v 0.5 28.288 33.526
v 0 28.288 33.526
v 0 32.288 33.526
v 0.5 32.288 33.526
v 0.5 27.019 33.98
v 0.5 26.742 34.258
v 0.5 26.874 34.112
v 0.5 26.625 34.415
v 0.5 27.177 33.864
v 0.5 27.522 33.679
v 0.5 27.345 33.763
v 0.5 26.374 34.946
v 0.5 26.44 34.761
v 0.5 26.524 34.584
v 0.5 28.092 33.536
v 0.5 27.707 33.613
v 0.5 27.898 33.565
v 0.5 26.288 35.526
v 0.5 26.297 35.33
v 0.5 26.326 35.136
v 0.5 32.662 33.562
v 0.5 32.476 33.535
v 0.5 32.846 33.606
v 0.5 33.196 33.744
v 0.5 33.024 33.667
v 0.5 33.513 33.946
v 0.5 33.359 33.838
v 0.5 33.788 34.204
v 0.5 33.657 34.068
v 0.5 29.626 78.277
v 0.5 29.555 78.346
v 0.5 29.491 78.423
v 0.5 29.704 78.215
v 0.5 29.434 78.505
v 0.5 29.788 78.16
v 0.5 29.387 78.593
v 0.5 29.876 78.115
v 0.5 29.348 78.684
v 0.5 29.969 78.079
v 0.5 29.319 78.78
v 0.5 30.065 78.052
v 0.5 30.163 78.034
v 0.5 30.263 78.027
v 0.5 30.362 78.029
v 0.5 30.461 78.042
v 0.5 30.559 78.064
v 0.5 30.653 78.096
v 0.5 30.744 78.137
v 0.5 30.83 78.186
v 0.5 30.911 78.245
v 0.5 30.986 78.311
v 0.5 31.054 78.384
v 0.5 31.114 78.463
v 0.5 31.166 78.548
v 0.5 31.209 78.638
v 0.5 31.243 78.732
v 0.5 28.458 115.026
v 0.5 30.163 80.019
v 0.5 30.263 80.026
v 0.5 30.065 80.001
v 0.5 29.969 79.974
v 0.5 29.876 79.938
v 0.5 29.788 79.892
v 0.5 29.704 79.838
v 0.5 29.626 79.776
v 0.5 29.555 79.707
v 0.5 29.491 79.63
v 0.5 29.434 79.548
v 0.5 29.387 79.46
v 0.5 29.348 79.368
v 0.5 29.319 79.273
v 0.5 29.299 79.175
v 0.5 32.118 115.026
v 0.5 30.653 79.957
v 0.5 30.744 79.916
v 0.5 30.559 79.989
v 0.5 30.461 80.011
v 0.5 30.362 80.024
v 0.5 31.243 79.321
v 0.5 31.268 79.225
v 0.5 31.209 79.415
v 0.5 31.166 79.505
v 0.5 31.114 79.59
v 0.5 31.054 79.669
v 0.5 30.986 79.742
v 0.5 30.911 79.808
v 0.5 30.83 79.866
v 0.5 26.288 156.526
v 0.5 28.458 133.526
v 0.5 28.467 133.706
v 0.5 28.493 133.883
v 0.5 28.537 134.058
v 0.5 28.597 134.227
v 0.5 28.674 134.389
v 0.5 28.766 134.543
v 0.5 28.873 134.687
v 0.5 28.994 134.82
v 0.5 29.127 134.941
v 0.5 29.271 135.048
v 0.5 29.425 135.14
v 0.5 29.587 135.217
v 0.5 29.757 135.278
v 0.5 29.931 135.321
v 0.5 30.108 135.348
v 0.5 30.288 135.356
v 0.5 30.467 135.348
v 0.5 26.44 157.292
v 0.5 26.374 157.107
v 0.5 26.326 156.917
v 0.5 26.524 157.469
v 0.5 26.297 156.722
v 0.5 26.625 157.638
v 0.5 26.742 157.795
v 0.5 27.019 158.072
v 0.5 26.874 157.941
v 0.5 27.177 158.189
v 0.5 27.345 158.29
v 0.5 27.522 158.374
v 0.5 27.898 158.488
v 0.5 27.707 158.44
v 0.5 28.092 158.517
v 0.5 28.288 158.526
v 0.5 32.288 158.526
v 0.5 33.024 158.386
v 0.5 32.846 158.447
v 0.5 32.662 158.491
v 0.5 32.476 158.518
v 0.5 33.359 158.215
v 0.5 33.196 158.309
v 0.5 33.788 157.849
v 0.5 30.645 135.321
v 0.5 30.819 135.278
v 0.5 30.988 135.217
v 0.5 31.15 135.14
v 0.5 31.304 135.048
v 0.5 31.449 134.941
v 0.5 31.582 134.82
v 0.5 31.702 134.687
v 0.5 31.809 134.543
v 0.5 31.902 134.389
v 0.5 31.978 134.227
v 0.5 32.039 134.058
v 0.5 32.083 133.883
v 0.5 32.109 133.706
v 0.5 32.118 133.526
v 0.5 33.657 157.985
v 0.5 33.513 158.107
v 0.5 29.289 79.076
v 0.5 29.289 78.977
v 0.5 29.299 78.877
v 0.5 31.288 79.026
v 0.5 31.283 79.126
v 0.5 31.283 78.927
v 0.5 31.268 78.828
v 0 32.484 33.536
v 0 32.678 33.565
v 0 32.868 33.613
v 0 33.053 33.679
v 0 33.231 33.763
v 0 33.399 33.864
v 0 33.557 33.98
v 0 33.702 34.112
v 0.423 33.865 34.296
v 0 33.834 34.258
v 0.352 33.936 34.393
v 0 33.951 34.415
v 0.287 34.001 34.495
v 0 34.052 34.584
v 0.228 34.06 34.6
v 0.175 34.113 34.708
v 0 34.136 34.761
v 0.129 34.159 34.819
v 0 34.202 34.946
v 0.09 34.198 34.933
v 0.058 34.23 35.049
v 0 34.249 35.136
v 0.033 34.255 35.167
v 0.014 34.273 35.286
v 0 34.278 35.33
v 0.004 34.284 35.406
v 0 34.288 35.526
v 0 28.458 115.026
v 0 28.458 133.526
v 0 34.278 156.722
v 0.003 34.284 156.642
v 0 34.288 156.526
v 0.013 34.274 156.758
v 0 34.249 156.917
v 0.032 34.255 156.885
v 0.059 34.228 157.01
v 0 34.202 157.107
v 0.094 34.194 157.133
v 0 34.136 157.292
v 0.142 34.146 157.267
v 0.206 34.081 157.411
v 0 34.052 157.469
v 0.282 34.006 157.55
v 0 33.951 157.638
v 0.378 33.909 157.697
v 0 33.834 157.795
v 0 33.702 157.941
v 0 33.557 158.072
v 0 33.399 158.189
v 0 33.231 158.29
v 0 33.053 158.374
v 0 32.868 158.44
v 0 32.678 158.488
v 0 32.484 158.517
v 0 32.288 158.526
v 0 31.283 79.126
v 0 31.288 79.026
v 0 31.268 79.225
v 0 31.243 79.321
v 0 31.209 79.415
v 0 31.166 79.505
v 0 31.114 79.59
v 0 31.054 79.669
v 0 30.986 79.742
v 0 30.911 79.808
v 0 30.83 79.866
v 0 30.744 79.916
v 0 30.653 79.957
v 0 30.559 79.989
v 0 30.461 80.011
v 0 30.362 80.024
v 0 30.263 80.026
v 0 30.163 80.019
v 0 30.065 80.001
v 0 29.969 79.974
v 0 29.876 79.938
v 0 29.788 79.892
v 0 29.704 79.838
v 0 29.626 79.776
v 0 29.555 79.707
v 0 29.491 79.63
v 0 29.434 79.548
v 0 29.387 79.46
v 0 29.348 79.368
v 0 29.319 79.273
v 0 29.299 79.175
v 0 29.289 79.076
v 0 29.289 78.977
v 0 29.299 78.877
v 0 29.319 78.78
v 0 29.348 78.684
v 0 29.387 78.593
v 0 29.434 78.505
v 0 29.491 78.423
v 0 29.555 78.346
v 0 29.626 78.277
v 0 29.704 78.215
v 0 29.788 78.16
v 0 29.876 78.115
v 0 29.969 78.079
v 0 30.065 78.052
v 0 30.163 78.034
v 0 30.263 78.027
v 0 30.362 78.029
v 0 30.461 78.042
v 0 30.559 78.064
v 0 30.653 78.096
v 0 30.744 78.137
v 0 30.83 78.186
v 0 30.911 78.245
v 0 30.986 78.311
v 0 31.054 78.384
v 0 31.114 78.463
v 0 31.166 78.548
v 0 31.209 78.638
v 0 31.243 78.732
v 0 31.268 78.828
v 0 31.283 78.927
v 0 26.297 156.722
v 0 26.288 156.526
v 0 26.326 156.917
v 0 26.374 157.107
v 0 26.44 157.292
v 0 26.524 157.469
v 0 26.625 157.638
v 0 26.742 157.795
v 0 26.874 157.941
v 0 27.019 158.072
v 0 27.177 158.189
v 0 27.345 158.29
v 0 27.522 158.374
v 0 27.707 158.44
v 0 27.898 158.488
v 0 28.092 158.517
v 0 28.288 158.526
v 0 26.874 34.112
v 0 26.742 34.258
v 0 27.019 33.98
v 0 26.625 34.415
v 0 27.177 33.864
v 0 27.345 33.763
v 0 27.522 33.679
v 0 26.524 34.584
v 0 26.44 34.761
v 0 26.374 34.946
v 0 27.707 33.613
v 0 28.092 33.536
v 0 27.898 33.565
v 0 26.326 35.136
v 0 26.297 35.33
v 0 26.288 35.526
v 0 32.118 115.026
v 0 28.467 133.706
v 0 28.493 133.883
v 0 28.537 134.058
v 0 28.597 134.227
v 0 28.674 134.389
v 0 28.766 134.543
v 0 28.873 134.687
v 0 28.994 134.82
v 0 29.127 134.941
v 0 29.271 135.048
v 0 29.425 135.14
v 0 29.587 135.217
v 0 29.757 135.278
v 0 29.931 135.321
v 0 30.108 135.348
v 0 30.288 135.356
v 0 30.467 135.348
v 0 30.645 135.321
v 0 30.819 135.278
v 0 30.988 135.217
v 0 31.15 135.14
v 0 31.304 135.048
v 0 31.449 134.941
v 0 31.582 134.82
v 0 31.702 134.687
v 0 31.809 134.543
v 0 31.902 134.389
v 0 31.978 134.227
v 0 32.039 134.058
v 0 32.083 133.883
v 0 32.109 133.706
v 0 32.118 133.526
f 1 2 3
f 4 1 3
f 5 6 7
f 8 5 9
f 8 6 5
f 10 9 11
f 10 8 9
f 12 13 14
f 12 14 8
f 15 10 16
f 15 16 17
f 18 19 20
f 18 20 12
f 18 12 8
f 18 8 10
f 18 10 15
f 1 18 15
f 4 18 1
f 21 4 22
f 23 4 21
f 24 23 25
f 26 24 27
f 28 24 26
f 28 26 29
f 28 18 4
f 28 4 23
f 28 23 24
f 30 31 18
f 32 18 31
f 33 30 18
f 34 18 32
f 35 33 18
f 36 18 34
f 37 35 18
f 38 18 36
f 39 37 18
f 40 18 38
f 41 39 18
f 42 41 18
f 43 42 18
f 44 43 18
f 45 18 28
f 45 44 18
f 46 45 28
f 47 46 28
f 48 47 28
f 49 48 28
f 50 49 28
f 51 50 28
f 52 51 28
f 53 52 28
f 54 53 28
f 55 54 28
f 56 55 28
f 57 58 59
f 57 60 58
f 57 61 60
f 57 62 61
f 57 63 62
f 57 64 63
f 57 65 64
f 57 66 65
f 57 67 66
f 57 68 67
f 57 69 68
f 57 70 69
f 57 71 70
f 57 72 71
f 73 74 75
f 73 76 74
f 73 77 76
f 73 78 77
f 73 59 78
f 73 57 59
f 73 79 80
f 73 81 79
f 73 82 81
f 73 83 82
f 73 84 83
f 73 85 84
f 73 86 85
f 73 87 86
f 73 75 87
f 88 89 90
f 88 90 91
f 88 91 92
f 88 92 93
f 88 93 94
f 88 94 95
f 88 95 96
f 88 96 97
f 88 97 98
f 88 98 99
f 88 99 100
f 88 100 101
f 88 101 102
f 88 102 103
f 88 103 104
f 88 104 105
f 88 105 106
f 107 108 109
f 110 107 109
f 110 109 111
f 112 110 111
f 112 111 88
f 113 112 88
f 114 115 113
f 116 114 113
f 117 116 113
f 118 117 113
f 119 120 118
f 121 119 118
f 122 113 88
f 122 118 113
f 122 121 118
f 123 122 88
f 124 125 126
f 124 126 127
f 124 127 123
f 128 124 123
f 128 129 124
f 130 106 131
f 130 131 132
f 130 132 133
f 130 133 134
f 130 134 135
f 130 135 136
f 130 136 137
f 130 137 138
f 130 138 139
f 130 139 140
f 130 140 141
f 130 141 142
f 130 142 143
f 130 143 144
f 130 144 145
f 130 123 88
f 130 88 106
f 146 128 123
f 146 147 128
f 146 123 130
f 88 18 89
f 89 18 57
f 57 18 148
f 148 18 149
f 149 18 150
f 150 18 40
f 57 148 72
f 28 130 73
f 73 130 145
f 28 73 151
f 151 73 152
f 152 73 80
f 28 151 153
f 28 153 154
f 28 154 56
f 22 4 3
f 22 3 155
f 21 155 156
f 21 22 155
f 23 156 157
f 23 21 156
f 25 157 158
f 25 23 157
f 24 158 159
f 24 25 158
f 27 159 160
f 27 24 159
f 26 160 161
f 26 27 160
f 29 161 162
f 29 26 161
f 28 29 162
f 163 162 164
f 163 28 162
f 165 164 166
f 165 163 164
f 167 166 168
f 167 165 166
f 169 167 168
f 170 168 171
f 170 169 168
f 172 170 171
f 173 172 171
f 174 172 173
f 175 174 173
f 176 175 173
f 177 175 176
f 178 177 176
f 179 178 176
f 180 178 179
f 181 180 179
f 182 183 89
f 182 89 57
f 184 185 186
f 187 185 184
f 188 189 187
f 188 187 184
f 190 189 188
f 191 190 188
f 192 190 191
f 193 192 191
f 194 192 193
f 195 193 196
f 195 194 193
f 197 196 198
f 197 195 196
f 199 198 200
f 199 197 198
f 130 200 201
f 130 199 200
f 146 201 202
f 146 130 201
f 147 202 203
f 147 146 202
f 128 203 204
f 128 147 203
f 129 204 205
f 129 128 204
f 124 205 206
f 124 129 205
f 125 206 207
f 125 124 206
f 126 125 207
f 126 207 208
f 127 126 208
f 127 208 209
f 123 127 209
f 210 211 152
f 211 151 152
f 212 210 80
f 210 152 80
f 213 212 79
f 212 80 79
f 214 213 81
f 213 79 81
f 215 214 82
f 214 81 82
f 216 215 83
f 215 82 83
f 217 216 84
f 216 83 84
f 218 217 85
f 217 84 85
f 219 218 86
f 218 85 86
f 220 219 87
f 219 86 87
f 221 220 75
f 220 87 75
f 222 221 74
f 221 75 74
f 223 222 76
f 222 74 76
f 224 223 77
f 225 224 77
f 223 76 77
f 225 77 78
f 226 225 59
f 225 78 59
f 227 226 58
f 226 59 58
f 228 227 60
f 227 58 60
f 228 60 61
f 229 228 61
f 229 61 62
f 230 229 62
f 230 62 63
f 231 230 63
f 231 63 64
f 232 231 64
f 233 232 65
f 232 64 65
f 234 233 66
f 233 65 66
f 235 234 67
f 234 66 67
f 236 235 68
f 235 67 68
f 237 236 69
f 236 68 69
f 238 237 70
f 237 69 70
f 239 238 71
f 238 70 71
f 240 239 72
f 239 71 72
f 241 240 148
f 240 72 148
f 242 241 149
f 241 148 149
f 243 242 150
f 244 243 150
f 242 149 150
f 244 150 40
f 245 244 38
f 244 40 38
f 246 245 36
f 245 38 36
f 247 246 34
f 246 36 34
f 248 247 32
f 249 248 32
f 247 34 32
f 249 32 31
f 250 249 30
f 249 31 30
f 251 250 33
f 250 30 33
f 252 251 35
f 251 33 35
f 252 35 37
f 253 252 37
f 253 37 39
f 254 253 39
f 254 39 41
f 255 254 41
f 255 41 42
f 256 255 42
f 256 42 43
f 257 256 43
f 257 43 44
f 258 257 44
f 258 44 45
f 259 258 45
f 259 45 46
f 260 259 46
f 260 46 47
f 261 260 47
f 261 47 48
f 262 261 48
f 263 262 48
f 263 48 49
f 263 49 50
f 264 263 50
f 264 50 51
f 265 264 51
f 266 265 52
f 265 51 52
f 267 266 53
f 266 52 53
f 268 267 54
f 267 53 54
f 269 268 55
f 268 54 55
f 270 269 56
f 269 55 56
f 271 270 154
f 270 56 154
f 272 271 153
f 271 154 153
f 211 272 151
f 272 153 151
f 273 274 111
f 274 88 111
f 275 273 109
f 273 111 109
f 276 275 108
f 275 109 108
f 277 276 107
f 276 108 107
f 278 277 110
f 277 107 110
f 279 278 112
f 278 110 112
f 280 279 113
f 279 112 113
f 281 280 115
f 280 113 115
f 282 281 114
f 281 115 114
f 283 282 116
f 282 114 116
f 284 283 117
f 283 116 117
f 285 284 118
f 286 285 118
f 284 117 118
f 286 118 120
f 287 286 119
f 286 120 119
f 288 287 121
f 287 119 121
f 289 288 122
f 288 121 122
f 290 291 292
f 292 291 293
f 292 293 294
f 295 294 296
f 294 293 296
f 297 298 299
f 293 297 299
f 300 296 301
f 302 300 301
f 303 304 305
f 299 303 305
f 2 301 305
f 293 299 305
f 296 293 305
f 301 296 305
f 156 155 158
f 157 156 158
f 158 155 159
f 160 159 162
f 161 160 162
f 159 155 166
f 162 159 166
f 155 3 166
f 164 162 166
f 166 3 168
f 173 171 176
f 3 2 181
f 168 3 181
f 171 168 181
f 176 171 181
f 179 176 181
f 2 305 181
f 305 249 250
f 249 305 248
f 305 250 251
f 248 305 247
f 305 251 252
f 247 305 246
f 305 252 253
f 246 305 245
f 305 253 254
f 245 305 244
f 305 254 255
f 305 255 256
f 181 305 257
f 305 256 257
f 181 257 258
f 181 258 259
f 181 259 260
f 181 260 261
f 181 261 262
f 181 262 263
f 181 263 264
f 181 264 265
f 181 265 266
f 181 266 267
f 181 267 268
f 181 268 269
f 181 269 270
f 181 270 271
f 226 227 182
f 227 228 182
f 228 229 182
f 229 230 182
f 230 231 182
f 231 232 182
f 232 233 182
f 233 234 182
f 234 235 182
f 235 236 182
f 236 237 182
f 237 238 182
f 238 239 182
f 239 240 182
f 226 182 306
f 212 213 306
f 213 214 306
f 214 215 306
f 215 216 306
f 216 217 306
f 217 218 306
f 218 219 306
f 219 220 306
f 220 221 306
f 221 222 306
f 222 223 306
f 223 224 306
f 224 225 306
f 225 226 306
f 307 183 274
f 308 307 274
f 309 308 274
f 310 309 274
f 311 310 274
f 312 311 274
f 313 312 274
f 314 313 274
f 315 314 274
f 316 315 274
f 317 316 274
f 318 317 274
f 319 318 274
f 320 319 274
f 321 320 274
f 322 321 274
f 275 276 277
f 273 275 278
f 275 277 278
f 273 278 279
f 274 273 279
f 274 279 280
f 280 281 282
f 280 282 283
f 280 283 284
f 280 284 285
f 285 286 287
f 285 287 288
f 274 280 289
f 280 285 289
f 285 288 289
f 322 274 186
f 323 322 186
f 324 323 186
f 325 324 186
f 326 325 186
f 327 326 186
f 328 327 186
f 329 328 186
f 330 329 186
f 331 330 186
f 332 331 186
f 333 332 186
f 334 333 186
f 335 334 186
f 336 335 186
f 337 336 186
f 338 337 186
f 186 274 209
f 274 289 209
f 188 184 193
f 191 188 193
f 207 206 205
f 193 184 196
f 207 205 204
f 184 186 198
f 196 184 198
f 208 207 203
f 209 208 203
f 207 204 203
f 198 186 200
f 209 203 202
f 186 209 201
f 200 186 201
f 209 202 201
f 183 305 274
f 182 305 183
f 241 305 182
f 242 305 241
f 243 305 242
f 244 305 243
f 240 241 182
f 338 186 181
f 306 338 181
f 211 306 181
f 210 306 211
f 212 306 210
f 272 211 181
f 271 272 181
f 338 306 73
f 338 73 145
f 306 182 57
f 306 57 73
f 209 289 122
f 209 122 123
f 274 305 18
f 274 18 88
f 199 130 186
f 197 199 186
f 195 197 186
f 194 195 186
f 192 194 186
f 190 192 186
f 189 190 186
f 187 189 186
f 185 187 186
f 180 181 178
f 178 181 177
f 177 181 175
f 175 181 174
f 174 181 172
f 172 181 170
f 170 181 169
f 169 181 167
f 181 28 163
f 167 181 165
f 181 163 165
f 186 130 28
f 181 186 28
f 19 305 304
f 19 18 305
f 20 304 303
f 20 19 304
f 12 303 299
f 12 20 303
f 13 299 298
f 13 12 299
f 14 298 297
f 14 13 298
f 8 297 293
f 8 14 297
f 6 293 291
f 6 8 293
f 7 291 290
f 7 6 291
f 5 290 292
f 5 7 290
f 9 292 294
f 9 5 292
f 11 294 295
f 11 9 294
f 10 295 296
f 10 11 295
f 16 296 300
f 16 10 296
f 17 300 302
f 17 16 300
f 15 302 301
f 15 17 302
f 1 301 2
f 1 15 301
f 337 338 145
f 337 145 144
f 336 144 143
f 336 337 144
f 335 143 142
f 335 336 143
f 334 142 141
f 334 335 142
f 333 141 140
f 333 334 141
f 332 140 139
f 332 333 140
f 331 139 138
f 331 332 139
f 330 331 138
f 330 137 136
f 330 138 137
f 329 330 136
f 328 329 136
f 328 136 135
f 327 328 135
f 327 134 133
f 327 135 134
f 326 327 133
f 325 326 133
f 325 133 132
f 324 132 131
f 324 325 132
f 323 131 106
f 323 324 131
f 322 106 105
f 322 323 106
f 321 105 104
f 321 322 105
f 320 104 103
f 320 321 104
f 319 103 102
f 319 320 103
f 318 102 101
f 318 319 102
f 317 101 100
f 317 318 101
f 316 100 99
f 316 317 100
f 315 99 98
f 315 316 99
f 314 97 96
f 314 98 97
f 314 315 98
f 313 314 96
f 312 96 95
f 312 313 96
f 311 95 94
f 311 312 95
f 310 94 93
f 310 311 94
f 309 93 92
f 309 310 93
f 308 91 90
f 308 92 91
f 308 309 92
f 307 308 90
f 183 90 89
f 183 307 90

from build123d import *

# Parameters (mm, degrees)
F0_W        = 8
F0_H        = 125
F1_DEPTH    = 0.5
F2_R        = 2
F3_R        = 1
F4_DEPTH    = 12.5
F5_T1_DEPTH = 125.3718610795


# Not quite as in the source:
# - a fillet or chamfer that OpenCascade refuses, or shapes differently, is made with other operations: its cross-section is extruded or revolved along the edge and cut away or added


with BuildPart() as f1:
    # F0 (on Right) → F1 (new body)
    with BuildSketch(Plane.YZ):
        with Locations((30.2877472714, 96.0264432559)):
            Rectangle(F0_W, F0_H)
    extrude(amount=F1_DEPTH)

    # F2
    f2_edges = [f1.edges().sort_by_distance(p)[0] for p in [
        (0.25, 26.287747, 158.526443),
        (0.25, 34.287747, 158.526443),
        (0.25, 34.287747, 33.526443),
        (0.25, 26.287747, 33.526443),
    ]]
    fillet(f2_edges, radius=F2_R)

    # F3 (on face) → F4 (cut, symmetric)
    with BuildSketch(Plane.YZ.offset(0.5)):
        with BuildLine():
            Line((28.4577472714, 133.5264432559), (28.4577472714, 115.0264432559))
            Line((28.4577472714, 115.0264432559), (32.1177472714, 115.0264432559))
            Line((32.1177472714, 115.0264432559), (32.1177472714, 133.5264432559))
            ThreePointArc((32.1177472714, 133.5264432559), (30.2877472714, 135.3564432559), (28.4577472714, 133.5264432559))
        make_face()
        with Locations((30.2877472714, 79.0264432559)):
            Circle(F3_R)
    extrude(amount=F4_DEPTH, both=True, mode=Mode.SUBTRACT)

    # F5: chamfer of 0.5 on 1 edges, made by hand

    # F5_s2 → F5_t1 (cut)
    with BuildSketch(Plane.XY.offset(33.3405127162)):
        Polygon((0.5, 33.7877472714), (0, 34.2877472714), (0.5, 34.2877472714), align=None)
    extrude(amount=F5_T1_DEPTH, mode=Mode.SUBTRACT)


solid = f1.part
